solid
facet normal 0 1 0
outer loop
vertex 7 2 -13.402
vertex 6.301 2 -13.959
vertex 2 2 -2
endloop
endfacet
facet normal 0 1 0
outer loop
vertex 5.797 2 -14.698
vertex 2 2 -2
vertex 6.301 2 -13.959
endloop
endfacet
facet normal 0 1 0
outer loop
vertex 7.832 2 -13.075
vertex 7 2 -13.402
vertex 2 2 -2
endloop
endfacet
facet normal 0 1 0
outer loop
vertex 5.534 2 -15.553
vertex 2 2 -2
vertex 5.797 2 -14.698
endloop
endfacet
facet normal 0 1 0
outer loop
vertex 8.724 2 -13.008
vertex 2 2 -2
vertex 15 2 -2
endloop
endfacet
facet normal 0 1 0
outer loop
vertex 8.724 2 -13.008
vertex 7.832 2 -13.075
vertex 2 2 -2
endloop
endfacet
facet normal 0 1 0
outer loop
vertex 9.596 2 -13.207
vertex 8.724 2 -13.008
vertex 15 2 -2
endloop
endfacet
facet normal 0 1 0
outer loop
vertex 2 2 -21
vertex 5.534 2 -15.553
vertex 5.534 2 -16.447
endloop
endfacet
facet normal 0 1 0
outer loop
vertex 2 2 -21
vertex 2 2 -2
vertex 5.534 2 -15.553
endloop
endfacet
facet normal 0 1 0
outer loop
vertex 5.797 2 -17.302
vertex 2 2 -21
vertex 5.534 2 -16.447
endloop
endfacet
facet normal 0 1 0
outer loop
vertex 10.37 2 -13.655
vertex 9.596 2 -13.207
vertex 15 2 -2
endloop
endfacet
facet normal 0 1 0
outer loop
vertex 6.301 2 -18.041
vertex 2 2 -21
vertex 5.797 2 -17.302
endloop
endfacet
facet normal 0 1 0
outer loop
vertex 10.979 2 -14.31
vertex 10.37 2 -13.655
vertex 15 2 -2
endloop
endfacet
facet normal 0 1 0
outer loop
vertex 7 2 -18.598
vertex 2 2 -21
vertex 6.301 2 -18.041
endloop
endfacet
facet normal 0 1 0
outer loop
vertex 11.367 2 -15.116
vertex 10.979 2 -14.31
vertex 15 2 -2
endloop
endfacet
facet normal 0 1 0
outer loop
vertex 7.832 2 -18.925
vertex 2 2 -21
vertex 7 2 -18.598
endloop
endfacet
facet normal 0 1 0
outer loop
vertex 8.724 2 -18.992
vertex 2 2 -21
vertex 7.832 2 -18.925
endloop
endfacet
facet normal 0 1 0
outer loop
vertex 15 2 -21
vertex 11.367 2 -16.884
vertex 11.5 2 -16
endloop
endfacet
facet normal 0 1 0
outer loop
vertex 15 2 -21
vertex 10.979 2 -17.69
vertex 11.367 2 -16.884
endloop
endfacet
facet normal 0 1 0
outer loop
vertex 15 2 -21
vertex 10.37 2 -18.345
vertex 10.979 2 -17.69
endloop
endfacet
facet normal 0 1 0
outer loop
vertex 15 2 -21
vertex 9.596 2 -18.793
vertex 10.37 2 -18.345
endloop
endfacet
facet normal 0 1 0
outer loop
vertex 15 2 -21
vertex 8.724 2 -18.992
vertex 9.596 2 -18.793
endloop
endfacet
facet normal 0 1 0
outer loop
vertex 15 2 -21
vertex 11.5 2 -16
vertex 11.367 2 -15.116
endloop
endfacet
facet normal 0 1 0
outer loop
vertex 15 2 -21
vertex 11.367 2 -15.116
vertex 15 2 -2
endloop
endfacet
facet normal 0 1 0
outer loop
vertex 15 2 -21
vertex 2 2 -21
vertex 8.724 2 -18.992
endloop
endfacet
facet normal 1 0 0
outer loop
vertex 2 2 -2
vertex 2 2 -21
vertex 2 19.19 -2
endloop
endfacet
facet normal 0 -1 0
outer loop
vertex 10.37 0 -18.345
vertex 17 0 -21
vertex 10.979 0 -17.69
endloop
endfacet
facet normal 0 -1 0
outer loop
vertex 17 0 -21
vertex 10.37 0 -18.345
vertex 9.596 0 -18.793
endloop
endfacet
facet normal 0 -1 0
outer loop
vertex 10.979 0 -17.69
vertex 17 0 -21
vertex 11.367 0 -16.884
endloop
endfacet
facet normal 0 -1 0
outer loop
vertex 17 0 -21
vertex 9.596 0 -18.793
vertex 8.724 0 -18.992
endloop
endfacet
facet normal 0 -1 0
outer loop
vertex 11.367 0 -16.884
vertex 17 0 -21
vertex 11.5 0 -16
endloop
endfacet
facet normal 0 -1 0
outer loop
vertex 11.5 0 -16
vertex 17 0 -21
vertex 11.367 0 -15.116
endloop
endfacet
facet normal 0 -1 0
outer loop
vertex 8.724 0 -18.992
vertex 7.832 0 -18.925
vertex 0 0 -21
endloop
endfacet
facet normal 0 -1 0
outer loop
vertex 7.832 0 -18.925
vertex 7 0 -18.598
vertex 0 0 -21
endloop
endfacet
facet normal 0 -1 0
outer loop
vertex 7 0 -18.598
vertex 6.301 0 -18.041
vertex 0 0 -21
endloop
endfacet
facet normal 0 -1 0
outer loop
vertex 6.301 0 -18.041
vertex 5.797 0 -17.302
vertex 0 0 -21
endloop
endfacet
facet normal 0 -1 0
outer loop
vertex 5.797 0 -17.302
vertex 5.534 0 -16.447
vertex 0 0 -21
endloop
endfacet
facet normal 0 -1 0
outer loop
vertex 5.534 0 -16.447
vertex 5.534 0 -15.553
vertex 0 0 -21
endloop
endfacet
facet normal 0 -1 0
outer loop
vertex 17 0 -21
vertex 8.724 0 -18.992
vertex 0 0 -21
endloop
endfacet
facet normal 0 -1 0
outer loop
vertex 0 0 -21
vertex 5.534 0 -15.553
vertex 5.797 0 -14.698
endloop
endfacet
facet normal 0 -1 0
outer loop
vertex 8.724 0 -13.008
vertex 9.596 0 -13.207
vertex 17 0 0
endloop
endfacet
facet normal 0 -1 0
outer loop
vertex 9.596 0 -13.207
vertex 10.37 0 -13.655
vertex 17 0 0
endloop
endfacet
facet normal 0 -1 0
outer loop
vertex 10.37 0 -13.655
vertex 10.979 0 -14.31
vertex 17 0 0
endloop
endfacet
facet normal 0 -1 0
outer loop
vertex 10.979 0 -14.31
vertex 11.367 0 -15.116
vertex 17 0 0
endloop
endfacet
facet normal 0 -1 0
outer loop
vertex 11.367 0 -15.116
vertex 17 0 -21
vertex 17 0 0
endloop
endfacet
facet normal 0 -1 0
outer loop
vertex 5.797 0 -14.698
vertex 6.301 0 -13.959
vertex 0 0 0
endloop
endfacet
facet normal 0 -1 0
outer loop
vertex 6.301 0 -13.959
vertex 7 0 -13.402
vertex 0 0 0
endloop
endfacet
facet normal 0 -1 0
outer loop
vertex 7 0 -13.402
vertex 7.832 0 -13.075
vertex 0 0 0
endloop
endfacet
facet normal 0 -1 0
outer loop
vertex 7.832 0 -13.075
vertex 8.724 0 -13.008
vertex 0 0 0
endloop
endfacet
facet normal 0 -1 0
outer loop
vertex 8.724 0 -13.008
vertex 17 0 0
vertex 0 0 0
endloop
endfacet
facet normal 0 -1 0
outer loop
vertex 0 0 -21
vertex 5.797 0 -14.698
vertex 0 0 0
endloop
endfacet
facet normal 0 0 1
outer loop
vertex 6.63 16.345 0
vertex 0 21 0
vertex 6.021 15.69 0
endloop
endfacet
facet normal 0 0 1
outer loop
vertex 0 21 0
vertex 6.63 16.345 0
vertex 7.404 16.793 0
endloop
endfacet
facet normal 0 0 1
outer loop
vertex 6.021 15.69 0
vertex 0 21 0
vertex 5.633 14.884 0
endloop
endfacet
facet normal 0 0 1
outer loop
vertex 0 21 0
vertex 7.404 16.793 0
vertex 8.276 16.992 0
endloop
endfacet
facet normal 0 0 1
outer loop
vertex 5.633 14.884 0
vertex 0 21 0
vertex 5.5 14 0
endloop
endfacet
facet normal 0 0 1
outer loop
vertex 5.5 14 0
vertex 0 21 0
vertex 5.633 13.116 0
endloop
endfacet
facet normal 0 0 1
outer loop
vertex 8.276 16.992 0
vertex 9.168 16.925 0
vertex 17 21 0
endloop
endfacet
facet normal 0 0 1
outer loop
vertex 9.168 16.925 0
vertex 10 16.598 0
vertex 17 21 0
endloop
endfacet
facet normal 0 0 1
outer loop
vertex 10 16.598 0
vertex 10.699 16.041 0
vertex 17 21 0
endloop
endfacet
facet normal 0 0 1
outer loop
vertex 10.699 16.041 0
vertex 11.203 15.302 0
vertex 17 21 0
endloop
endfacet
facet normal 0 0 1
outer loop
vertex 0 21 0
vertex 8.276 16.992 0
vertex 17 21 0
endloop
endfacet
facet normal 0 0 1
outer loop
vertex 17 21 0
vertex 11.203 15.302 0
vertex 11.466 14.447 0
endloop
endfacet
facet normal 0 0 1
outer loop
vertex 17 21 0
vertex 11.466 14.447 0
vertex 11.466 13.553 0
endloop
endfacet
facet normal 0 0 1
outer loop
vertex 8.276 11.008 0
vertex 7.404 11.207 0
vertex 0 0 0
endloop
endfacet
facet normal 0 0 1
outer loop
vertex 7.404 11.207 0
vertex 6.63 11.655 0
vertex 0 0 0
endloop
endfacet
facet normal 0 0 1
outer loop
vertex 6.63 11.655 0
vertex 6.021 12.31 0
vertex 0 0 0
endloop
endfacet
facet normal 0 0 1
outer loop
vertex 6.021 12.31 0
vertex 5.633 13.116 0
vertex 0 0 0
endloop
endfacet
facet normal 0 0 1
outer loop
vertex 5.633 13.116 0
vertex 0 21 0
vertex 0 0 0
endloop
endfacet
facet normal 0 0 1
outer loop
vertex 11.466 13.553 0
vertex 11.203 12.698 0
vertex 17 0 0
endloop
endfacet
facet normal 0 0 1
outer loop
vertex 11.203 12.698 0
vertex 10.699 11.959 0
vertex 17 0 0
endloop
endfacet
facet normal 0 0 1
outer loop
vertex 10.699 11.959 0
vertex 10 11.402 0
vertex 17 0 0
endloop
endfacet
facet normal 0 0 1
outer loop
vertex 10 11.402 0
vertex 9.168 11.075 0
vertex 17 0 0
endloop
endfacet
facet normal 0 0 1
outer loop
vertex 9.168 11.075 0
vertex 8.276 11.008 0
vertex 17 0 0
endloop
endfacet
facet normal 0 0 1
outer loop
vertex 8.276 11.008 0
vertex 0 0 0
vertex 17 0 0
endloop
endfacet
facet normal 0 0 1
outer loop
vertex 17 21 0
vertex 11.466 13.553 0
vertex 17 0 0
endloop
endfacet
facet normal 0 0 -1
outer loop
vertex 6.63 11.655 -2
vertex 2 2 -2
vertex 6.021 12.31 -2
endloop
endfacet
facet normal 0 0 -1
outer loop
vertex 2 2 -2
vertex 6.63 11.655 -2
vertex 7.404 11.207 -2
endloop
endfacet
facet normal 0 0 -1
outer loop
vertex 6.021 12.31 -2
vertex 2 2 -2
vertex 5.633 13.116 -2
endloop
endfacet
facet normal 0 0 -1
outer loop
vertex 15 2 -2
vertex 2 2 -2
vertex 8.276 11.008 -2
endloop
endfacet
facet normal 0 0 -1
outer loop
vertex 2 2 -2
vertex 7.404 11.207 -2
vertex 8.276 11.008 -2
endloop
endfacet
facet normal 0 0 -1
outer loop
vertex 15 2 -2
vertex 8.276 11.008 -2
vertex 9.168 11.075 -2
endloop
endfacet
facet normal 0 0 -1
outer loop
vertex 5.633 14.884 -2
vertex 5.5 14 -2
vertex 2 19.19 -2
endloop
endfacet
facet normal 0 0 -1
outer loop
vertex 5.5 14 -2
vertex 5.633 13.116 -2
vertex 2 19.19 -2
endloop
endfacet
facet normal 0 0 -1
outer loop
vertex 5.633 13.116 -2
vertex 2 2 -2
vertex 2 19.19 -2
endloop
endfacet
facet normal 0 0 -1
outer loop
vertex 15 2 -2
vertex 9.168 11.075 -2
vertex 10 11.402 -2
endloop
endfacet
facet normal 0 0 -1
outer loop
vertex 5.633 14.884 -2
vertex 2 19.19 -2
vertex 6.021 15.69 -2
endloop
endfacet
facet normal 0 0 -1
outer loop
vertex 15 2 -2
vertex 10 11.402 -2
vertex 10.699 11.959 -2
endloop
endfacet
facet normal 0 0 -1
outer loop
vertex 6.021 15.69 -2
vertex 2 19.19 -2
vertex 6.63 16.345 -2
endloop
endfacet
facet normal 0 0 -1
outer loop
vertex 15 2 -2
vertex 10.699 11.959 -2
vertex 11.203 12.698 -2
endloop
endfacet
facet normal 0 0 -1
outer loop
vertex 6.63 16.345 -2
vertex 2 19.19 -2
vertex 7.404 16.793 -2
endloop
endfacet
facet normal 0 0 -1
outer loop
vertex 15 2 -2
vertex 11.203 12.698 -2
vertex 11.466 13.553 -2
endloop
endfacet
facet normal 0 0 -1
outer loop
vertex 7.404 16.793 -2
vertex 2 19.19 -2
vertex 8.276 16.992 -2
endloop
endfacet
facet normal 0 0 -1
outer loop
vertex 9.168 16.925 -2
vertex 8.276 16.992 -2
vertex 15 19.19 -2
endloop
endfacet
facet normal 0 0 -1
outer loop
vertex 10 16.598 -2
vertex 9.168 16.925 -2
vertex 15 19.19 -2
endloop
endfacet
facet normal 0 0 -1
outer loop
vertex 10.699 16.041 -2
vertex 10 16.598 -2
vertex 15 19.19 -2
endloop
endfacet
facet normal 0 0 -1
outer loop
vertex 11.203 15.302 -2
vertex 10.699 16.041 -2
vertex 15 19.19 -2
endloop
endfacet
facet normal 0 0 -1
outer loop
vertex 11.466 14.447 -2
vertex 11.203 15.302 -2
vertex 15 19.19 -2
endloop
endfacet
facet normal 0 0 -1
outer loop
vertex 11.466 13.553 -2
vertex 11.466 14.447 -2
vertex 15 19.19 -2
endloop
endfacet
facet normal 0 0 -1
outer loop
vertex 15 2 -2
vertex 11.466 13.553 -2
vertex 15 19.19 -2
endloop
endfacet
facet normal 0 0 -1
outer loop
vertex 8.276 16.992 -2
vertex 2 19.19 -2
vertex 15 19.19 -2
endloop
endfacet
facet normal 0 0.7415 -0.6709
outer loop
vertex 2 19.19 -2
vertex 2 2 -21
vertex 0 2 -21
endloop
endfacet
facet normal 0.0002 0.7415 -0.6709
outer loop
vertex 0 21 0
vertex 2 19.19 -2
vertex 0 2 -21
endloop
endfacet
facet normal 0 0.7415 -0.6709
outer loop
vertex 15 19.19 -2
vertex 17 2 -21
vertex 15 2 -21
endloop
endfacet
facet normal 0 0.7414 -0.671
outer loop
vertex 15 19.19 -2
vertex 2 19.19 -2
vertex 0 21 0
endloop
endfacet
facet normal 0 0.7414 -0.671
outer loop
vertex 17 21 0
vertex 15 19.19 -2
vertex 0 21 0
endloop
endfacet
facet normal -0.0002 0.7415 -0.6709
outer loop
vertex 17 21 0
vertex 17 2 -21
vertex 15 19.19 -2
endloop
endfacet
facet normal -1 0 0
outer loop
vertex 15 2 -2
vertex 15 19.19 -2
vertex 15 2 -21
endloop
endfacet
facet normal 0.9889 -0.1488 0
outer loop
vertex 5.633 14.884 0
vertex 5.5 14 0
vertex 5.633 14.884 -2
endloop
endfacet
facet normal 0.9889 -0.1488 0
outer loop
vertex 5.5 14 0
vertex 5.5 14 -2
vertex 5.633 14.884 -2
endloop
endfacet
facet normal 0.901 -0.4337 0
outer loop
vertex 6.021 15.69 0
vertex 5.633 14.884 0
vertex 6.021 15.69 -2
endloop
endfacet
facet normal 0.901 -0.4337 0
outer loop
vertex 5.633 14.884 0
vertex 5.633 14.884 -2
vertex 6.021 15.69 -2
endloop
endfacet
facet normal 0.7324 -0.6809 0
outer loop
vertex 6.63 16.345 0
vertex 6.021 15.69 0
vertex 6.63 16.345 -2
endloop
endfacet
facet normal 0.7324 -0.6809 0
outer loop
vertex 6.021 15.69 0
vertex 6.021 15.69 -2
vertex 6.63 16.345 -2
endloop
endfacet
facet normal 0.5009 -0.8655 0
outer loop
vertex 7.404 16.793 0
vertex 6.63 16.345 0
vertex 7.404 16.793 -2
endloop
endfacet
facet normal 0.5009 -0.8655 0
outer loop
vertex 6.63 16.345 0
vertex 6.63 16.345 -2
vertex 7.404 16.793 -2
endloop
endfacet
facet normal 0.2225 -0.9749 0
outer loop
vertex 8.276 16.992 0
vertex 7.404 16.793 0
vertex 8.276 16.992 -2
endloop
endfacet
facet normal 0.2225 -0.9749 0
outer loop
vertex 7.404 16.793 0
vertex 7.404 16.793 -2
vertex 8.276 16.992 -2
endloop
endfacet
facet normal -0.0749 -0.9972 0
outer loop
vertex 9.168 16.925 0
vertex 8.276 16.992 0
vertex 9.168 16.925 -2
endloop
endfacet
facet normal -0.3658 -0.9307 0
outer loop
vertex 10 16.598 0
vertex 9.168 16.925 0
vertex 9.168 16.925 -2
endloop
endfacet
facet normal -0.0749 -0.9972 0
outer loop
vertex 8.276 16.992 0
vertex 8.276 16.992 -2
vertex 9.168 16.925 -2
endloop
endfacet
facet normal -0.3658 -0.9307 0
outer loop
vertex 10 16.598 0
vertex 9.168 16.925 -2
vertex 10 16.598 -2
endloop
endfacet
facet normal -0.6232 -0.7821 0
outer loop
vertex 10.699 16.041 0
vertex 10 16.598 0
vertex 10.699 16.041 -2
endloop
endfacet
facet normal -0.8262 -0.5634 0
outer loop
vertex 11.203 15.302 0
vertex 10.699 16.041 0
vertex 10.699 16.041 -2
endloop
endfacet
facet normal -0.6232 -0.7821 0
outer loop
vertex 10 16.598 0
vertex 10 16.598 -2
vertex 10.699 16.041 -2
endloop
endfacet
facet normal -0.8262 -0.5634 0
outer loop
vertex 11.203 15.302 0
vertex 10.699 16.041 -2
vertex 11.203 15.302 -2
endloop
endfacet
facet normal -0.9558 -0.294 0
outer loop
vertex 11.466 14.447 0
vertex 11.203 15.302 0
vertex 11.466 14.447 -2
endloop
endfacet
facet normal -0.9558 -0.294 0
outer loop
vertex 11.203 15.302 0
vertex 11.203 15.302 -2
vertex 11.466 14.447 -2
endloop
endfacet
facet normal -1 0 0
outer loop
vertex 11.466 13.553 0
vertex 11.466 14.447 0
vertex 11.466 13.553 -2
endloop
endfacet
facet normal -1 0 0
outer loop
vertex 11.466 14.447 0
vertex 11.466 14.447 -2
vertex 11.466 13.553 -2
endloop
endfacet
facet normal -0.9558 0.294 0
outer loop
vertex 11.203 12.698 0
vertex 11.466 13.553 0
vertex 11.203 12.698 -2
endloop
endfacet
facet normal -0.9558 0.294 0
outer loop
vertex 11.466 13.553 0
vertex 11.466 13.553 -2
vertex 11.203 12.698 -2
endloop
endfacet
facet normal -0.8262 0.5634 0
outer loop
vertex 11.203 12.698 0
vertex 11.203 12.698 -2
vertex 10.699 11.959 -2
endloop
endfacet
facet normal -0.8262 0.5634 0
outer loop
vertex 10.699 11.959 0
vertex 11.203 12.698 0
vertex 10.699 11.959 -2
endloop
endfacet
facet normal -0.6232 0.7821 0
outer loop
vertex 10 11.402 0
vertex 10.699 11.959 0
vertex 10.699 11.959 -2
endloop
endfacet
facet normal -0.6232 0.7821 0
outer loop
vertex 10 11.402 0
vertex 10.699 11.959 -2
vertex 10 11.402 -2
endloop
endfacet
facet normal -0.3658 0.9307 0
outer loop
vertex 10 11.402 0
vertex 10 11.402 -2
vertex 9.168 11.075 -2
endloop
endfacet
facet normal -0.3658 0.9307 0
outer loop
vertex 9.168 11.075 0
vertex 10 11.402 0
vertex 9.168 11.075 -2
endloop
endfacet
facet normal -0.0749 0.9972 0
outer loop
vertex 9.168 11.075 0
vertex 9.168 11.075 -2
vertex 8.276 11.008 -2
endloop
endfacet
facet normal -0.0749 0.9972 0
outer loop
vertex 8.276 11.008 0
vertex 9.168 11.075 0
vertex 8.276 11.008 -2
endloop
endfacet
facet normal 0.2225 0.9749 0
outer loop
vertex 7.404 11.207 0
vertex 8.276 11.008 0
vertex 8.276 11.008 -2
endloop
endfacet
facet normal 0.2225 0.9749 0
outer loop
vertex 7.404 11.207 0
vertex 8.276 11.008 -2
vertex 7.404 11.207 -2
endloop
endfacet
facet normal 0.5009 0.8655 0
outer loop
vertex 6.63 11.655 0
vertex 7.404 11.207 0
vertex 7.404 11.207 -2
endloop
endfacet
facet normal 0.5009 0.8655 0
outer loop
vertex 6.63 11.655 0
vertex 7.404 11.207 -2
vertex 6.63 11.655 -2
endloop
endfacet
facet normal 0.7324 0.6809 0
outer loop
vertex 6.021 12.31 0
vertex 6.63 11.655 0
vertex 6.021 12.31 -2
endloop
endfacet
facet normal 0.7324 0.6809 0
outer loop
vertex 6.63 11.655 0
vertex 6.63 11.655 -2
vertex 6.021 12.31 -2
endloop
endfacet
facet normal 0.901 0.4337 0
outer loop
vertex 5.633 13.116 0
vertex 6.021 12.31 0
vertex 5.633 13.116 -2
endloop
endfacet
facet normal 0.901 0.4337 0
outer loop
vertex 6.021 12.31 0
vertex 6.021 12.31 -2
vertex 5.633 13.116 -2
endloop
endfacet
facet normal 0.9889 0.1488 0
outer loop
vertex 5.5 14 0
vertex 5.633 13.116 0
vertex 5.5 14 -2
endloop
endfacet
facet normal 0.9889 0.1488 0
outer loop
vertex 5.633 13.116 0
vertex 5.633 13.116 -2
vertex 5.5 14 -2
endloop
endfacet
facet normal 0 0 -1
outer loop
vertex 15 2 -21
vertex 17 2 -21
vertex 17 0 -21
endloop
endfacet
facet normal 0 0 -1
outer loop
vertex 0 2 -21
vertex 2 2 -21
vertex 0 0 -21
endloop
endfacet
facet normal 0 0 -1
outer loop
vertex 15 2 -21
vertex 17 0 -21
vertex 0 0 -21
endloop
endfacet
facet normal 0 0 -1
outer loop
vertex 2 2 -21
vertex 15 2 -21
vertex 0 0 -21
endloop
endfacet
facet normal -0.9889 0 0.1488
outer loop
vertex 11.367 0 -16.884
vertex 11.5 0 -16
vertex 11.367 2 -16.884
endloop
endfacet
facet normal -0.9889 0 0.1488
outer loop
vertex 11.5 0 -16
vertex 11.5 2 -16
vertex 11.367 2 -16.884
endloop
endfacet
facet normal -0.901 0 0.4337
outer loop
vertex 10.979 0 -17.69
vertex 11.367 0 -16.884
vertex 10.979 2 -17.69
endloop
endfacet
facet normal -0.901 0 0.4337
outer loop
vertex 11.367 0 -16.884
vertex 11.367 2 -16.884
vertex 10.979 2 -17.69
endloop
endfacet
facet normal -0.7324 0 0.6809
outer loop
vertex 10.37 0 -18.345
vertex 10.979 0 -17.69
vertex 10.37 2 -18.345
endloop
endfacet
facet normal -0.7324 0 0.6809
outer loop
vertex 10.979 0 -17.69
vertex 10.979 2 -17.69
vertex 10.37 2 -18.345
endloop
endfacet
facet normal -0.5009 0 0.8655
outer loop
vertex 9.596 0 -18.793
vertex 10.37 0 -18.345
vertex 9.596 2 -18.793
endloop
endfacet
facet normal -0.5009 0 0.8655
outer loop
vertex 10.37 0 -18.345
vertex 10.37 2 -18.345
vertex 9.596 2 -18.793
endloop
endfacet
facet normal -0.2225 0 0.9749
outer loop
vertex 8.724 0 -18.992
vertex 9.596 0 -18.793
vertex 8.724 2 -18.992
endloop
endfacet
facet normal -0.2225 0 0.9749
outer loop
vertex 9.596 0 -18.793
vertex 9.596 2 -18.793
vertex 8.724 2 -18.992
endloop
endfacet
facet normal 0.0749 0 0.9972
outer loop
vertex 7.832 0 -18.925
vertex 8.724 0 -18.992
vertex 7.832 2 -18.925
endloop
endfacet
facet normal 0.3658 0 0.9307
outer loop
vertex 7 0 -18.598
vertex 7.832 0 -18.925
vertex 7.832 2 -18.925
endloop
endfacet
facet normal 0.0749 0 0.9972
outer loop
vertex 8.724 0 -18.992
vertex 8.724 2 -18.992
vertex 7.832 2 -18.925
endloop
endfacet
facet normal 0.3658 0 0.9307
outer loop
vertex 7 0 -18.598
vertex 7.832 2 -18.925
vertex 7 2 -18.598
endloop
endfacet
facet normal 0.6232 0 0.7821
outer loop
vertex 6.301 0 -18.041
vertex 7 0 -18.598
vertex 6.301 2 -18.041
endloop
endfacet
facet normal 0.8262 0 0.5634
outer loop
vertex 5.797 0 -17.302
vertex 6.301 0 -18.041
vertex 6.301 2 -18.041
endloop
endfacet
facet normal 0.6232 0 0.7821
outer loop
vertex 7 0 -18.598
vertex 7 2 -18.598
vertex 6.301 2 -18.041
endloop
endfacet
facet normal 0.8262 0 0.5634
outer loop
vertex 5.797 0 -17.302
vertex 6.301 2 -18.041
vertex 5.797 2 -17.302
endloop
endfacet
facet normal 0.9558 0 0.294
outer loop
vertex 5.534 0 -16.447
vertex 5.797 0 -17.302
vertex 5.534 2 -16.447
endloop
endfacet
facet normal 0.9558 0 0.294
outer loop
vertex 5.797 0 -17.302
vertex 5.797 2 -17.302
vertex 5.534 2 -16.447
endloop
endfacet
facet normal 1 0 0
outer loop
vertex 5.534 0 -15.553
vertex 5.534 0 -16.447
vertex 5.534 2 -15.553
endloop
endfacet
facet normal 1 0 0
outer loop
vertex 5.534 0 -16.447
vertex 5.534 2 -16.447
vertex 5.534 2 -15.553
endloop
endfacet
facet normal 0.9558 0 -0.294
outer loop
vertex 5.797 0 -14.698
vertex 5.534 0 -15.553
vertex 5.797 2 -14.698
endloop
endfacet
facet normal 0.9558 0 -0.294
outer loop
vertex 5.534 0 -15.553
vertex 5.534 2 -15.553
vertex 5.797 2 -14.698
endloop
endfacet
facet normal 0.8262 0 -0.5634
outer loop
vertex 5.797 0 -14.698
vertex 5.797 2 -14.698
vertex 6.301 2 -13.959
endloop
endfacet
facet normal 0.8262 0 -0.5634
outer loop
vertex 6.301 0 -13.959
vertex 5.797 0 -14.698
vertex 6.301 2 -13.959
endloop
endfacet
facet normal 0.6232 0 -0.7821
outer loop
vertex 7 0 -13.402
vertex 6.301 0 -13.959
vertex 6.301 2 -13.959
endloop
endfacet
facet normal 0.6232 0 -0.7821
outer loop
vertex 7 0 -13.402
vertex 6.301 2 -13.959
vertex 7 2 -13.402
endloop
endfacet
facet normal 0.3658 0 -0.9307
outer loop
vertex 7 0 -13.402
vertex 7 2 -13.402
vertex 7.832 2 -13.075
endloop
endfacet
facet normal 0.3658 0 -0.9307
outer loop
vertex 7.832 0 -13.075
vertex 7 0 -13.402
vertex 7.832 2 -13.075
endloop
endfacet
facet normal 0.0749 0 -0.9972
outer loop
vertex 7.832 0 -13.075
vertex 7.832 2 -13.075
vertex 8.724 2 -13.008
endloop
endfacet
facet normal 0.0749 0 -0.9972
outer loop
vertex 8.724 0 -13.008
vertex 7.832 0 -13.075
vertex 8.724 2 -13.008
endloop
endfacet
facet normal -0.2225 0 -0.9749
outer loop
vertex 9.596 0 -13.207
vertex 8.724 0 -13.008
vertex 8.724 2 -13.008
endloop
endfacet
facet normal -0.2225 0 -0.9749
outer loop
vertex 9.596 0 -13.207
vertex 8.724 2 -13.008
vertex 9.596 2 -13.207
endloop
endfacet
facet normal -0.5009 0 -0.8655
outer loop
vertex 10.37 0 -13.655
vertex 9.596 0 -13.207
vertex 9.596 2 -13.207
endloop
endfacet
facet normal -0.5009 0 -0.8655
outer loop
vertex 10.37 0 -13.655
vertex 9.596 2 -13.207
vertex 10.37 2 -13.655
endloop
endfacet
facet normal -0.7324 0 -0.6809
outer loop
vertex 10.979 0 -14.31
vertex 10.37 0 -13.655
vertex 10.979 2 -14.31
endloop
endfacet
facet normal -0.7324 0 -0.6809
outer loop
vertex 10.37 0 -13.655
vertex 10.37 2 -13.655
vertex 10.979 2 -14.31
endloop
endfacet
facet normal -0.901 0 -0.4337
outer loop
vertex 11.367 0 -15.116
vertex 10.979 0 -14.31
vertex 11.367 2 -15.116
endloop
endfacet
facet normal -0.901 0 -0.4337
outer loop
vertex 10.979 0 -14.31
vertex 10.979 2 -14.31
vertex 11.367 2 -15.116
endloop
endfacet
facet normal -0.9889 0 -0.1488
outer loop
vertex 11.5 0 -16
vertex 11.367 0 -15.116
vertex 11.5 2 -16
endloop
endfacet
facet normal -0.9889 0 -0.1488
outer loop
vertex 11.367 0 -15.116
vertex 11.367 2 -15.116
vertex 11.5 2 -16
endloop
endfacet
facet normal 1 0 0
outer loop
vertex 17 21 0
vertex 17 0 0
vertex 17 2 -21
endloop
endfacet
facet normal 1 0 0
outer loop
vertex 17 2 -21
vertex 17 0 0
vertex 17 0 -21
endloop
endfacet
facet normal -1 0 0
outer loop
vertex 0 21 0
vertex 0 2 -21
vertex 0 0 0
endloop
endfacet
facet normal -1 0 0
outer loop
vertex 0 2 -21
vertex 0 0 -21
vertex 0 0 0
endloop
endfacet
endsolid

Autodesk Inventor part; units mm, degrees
ref_plane "YZ Plane" through (0, 0, 0) normal (1, 0, 0) x (0, 1, 0)
ref_plane "XZ Plane" through (0, 0, 0) normal (0, 1, 0) x (-1, 0, 0)
ref_plane "XY Plane" through (0, 0, 0) normal (0, 0, 1) x (1, 0, 0)
sketch "Boceto2" plane through (0, 0, 0) normal (0, 1, 0) x (-1, 0, 0)
  line L0 (0, 0) -> (-17, 0)
  line L1 (-17, 0) -> (-17, -21)
  line L2 (-17, -21) -> (0, -21)
  line L3 (0, -21) -> (0, 0)
  dimension "d0" = 17
  dimension "d1" = 21
  dimension "d2" = 17
extrude "Extrusión1" add sketch "Boceto2" along normal blind 2
sketch "Boceto3" plane through (0, 2, 0) normal (0, 1, 0) x (1, 0, 0)
  line L0 (0, 0) -> (17, 0) projected
  line L1 (0, 0) -> (0, 21)
  line L2 (0, 21) -> (0, 0) projected
  line L3 (0, 21) -> (17, 21)
  line L4 (17, 0) -> (17, 21) projected
  line L5 (0, 0) -> (17, 0)
  line L6 (17, 0) -> (17, 21)
  dimension "d5" = 21
extrude "Extrusión3" add sketch "Boceto3" along normal blind 19
sketch "Boceto5" plane through (0, 21, 0) normal (0, 1, 0) x (1, 0, 0)
  line L0 (17, 21) -> (0, 21) projected
  line L1 (2, 21) -> (2, 2)
  line L2 (2, 2) -> (15, 2)
  line L3 (15, 2) -> (15, 21)
  line L4 (15, 21) -> (2, 21)
  point P0 (0, 0)
extrude "Extrusión5" cut sketch "Boceto5" against normal blind 19
sketch "Boceto6" plane through (17, 0, 0) normal (1, 0, 0) x (0, 0, -1)
  line L0 (0, 0) -> (21, 0) projected
  line L1 (0, 21) -> (21, 21) projected
  line L2 (21, 2) -> (0, 21)
  line L3 (0, 21) -> (21, 21)
  line L4 (21, 21) -> (21, 2)
extrude "Extrusión6" cut sketch "Boceto6" against normal blind 19
sketch "Boceto7" plane through (0, 2, 0) normal (0, 1, 0) x (1, 0, 0)
  line L0 (0, 0) -> (17, 0) projected
  circle A0 centre (8.5, 16) radius 3
extrude "Extrusión7" cut sketch "Boceto7" against normal blind 19
sketch "Boceto8" plane through (15, 2, -2) normal (0, 0, -1) x (-1, 0, 0)
  line L0 (-2, -2) -> (15, -2) projected
  circle A0 centre (6.5, 12) radius 3
extrude "Extrusión8" cut sketch "Boceto8" against normal blind 19
properties part number "Triangulo"
